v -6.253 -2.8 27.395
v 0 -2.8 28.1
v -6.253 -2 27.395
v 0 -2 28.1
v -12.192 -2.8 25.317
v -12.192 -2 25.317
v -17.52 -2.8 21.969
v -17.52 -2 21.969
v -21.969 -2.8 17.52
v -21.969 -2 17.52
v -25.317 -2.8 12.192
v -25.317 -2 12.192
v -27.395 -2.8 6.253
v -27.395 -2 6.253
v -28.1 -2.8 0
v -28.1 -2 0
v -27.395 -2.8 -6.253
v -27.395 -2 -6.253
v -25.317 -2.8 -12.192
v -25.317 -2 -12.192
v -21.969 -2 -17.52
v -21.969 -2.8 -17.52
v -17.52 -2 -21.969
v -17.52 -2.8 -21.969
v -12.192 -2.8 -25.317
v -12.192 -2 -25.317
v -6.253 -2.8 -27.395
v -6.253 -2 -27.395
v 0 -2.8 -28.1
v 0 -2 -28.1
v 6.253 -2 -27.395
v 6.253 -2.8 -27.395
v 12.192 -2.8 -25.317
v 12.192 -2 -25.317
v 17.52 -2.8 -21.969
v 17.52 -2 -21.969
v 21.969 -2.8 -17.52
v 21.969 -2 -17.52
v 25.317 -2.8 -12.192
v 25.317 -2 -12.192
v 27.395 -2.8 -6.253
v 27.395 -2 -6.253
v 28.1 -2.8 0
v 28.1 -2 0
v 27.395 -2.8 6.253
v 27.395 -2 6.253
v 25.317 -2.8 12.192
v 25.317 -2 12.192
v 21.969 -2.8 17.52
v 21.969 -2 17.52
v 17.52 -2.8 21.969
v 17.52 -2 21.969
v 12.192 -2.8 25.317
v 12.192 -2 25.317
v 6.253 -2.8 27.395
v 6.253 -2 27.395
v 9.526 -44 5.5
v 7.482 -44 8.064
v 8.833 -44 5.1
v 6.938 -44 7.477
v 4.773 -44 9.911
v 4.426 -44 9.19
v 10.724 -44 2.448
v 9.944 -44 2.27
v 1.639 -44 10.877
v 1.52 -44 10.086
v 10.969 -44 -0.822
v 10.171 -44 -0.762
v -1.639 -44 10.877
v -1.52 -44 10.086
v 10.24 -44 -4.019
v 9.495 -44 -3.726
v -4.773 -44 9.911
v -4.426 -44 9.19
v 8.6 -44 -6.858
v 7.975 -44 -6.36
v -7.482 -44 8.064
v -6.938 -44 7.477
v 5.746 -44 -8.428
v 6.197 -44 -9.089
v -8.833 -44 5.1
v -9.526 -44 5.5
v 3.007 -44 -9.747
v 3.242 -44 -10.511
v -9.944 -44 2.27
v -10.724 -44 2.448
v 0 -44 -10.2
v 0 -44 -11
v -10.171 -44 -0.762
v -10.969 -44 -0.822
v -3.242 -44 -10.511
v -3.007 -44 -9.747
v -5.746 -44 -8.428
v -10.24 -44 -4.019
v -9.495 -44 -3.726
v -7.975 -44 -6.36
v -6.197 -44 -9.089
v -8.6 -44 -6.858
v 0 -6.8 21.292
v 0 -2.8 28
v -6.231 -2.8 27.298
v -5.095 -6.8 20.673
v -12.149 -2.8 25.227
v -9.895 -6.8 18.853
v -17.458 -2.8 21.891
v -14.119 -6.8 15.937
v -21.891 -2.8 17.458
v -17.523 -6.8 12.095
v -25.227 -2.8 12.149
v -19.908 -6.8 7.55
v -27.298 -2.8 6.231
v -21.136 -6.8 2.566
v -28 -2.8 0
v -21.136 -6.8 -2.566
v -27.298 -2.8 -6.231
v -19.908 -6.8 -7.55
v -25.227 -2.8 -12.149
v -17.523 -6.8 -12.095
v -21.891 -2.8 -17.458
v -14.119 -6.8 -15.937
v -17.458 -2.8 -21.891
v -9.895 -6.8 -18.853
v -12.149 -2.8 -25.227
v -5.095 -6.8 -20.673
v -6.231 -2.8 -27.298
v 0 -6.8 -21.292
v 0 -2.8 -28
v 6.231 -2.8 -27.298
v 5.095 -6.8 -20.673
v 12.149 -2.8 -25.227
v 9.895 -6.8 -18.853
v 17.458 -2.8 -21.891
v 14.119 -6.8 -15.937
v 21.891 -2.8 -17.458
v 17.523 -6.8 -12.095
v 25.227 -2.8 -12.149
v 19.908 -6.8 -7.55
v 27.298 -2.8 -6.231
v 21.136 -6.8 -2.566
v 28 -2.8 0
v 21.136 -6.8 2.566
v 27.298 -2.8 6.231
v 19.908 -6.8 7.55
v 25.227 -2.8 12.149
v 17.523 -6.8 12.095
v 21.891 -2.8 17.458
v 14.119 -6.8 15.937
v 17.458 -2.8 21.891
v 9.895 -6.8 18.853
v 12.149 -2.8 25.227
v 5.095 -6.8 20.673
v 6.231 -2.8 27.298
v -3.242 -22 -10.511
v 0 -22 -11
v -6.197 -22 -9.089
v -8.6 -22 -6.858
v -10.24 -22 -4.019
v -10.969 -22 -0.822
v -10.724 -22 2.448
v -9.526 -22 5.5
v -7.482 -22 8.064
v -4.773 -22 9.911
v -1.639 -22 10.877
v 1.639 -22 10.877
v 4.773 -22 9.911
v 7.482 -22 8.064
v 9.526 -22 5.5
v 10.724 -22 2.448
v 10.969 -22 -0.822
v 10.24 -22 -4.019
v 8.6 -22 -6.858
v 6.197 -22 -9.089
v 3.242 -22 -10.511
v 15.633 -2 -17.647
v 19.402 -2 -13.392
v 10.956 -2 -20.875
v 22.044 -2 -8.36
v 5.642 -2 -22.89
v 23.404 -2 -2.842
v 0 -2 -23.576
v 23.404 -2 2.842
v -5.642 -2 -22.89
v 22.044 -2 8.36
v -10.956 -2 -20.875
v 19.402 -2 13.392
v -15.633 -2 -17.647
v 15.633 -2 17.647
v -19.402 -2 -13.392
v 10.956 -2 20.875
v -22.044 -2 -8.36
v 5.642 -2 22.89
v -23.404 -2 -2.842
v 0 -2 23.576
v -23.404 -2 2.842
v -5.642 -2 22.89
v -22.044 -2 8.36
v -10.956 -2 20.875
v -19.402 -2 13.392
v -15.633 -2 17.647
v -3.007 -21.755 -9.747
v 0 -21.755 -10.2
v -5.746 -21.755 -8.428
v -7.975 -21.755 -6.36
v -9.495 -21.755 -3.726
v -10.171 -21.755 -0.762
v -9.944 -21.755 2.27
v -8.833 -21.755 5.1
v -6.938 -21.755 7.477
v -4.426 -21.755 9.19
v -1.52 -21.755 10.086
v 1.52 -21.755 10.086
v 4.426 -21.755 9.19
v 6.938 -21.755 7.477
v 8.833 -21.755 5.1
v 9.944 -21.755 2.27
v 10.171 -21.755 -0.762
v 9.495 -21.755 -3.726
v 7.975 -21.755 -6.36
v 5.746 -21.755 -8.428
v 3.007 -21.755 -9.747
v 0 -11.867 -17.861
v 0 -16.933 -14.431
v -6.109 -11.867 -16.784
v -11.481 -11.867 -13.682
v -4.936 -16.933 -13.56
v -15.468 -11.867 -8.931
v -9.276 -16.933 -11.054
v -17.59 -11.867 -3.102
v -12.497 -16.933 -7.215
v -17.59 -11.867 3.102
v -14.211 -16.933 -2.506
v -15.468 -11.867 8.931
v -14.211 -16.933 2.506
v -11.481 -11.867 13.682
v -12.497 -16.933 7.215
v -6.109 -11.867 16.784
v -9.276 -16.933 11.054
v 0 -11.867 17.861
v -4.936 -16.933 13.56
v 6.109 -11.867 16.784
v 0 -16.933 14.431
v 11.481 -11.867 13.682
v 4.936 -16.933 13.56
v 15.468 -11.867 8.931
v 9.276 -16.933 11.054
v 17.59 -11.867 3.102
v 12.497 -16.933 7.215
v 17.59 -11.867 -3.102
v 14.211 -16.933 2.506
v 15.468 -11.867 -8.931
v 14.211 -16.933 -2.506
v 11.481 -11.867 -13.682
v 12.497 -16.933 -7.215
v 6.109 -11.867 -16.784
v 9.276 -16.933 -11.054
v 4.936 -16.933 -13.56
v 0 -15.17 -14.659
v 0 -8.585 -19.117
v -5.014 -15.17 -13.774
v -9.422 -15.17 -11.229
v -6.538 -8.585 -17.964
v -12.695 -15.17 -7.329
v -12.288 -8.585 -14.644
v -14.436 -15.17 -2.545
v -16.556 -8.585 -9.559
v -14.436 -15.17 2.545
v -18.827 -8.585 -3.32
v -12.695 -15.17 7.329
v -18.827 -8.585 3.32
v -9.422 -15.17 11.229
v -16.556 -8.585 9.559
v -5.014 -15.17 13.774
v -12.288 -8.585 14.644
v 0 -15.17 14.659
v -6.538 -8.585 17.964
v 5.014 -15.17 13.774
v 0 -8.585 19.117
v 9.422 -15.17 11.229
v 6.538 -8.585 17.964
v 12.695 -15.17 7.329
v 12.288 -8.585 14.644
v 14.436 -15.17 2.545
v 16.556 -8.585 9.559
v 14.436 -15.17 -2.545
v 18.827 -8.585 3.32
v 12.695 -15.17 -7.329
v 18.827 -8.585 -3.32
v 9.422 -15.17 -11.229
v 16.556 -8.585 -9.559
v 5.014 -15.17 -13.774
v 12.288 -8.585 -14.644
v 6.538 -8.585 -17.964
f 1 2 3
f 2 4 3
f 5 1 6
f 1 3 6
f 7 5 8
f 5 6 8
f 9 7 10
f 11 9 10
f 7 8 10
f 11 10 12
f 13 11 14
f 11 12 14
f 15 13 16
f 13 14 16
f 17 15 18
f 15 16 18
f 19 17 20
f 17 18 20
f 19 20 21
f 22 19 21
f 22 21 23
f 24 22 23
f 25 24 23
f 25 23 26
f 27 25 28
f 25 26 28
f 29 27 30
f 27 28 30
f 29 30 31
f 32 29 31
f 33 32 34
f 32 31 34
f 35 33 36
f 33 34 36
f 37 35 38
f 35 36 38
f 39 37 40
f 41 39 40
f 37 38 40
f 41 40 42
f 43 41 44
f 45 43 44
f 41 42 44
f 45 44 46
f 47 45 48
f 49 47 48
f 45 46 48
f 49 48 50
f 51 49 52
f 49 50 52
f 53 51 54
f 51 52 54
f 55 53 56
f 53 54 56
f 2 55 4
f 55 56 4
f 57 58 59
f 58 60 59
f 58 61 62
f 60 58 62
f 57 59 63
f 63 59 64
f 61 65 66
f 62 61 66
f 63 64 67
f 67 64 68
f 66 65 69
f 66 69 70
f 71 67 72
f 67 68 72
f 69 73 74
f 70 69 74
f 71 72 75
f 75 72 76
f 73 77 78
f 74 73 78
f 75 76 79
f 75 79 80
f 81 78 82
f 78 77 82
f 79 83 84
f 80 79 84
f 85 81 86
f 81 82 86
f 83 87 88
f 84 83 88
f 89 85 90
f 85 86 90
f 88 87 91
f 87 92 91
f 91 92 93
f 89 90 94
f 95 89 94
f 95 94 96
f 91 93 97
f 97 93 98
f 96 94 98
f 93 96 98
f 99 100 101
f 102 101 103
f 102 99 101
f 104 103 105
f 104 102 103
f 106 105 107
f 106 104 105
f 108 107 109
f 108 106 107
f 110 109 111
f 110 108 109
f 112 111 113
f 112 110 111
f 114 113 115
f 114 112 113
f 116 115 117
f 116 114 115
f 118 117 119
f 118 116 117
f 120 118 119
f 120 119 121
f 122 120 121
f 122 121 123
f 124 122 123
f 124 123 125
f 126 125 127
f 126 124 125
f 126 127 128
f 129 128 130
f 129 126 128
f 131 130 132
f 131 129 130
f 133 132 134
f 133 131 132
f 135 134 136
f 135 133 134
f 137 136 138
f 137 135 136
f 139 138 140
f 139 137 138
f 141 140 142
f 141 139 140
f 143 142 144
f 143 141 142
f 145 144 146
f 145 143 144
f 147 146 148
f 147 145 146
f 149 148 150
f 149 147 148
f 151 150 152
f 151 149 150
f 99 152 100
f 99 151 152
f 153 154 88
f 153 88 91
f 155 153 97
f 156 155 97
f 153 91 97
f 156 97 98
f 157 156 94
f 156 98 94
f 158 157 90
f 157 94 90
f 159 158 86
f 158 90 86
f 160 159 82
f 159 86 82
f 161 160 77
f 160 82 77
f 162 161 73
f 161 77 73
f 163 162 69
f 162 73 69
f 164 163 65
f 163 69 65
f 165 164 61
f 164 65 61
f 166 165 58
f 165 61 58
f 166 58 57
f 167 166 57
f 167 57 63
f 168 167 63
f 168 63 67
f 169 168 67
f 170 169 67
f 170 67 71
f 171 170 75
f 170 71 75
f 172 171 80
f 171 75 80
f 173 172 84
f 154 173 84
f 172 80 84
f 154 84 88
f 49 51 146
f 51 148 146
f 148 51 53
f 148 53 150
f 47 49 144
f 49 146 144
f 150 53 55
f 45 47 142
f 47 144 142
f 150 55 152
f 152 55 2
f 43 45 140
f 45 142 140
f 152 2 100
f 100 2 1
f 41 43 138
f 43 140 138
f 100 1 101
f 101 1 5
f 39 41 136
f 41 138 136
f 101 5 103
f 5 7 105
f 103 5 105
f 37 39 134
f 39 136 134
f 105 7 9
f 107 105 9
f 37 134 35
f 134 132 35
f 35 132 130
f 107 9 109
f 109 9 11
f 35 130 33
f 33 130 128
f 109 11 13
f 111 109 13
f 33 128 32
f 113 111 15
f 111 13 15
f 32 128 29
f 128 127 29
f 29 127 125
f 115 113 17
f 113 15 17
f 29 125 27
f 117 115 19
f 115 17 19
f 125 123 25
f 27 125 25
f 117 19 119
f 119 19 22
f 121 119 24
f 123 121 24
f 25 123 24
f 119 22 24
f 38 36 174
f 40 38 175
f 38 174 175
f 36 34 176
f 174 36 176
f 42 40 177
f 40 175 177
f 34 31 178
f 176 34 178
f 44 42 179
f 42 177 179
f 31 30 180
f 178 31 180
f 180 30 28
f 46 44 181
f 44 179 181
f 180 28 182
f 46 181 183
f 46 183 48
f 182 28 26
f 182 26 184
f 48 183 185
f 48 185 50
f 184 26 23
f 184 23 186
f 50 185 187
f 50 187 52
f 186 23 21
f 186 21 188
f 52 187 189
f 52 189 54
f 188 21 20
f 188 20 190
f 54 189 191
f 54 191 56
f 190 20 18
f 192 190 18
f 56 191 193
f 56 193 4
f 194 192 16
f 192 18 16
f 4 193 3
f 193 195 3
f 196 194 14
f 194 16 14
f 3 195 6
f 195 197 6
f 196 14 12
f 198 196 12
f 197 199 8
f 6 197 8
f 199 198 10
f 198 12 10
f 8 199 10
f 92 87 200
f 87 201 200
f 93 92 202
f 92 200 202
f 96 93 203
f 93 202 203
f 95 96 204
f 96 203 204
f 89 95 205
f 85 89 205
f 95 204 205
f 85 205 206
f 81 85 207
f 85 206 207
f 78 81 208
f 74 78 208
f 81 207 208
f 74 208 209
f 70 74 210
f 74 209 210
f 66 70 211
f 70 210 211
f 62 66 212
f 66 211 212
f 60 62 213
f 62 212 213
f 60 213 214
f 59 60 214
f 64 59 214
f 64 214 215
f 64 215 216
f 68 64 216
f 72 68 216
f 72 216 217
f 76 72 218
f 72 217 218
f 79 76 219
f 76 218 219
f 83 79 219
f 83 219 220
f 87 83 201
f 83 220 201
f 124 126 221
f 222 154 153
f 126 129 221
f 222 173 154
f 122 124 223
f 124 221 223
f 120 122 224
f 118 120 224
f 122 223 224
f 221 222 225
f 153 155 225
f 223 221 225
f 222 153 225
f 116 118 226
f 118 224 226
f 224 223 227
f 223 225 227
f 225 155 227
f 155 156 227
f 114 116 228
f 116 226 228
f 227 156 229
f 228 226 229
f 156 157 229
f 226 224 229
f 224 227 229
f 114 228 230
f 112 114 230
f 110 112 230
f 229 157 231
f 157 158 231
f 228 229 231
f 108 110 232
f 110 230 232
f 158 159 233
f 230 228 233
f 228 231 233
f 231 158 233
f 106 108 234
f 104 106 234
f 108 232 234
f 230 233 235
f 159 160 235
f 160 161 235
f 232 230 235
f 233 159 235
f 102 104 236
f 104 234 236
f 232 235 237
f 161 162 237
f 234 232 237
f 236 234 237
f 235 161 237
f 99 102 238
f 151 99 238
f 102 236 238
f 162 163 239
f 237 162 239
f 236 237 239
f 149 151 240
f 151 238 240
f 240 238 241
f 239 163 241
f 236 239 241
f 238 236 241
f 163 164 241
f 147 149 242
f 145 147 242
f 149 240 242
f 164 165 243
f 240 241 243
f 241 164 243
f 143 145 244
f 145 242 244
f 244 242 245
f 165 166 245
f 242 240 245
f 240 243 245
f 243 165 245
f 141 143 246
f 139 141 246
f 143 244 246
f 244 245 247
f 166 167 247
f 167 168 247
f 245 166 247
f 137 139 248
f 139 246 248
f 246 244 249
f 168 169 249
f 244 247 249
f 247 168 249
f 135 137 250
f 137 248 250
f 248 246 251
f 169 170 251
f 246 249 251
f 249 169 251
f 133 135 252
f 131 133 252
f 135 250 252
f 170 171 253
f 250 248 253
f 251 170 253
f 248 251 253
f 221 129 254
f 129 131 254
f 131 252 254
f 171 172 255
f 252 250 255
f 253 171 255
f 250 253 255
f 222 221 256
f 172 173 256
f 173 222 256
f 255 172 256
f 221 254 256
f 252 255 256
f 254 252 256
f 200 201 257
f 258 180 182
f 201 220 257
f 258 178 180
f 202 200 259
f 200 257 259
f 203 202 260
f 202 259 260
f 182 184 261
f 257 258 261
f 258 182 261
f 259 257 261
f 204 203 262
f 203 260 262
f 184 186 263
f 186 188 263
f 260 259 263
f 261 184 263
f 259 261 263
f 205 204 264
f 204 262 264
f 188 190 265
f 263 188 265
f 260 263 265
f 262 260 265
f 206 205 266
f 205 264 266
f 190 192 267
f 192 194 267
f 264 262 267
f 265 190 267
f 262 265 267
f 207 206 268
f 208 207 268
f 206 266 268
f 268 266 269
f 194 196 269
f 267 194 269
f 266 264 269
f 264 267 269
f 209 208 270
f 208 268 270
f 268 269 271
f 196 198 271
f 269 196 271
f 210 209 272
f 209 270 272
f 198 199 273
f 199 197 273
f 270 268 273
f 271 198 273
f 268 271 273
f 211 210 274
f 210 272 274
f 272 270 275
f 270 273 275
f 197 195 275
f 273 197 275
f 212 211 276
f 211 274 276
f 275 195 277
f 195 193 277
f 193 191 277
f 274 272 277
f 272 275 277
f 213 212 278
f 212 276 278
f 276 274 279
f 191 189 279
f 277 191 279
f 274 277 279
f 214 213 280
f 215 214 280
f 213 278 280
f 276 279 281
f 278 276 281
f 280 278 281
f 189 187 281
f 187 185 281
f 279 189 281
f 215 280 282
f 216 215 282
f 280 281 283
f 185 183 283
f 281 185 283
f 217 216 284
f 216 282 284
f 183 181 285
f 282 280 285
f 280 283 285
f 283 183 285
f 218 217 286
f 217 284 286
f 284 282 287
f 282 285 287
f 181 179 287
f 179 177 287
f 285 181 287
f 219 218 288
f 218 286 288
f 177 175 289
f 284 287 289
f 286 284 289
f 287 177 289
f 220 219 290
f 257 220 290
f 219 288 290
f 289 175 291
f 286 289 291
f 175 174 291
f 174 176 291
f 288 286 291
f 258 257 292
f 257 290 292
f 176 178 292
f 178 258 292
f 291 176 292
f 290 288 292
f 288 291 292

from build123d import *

# Parameters (mm, degrees)
SKETCH4_W = 0.9
SKETCH4_H = 0.8


with BuildPart() as part:
    # Sketch3 → Revolve3 (revolve)
    with BuildSketch(Plane.XY, mode=Mode.PRIVATE) as revolve3_sk:
        Polygon((-11, -44), (-10.2, -44), (-10.2, -21.754642132), (-23.575538943, -2), (-29, -2), (-29, -2.8), (-28, -2.8), (-28, -3.8), (-21.291666667, -6.8), (-11, -22), align=None)
    revolve(revolve3_sk.sketch.rotate(Axis((0, 0, 0), (0, 1, 0)), 270), axis=Axis((0, 0, 0), (0, 1, 0)))

    # Sketch4 → Cut-Revolve1 (revolve, cut)
    with BuildSketch(Plane.XY, mode=Mode.PRIVATE) as cut_revolve1_sk:
        with Locations((-28.55, -2.4)):
            Rectangle(SKETCH4_W, SKETCH4_H)
    revolve(cut_revolve1_sk.sketch.rotate(Axis((0, 0, 0), (0, -1, 0)), 270), axis=Axis((0, 0, 0), (0, -1, 0)), mode=Mode.SUBTRACT)

    # Sketch5 → Cut-Revolve2 (revolve, cut)
    with BuildSketch(Plane.XY, mode=Mode.PRIVATE) as cut_revolve2_sk:
        Polygon((-21.291666667, -6.8), (-28, -3.8), (-28, -2.8), align=None)
    revolve(cut_revolve2_sk.sketch.rotate(Axis((0, 0, 0), (0, -1, 0)), 270), axis=Axis((0, 0, 0), (0, -1, 0)), mode=Mode.SUBTRACT)


solid = part.part
